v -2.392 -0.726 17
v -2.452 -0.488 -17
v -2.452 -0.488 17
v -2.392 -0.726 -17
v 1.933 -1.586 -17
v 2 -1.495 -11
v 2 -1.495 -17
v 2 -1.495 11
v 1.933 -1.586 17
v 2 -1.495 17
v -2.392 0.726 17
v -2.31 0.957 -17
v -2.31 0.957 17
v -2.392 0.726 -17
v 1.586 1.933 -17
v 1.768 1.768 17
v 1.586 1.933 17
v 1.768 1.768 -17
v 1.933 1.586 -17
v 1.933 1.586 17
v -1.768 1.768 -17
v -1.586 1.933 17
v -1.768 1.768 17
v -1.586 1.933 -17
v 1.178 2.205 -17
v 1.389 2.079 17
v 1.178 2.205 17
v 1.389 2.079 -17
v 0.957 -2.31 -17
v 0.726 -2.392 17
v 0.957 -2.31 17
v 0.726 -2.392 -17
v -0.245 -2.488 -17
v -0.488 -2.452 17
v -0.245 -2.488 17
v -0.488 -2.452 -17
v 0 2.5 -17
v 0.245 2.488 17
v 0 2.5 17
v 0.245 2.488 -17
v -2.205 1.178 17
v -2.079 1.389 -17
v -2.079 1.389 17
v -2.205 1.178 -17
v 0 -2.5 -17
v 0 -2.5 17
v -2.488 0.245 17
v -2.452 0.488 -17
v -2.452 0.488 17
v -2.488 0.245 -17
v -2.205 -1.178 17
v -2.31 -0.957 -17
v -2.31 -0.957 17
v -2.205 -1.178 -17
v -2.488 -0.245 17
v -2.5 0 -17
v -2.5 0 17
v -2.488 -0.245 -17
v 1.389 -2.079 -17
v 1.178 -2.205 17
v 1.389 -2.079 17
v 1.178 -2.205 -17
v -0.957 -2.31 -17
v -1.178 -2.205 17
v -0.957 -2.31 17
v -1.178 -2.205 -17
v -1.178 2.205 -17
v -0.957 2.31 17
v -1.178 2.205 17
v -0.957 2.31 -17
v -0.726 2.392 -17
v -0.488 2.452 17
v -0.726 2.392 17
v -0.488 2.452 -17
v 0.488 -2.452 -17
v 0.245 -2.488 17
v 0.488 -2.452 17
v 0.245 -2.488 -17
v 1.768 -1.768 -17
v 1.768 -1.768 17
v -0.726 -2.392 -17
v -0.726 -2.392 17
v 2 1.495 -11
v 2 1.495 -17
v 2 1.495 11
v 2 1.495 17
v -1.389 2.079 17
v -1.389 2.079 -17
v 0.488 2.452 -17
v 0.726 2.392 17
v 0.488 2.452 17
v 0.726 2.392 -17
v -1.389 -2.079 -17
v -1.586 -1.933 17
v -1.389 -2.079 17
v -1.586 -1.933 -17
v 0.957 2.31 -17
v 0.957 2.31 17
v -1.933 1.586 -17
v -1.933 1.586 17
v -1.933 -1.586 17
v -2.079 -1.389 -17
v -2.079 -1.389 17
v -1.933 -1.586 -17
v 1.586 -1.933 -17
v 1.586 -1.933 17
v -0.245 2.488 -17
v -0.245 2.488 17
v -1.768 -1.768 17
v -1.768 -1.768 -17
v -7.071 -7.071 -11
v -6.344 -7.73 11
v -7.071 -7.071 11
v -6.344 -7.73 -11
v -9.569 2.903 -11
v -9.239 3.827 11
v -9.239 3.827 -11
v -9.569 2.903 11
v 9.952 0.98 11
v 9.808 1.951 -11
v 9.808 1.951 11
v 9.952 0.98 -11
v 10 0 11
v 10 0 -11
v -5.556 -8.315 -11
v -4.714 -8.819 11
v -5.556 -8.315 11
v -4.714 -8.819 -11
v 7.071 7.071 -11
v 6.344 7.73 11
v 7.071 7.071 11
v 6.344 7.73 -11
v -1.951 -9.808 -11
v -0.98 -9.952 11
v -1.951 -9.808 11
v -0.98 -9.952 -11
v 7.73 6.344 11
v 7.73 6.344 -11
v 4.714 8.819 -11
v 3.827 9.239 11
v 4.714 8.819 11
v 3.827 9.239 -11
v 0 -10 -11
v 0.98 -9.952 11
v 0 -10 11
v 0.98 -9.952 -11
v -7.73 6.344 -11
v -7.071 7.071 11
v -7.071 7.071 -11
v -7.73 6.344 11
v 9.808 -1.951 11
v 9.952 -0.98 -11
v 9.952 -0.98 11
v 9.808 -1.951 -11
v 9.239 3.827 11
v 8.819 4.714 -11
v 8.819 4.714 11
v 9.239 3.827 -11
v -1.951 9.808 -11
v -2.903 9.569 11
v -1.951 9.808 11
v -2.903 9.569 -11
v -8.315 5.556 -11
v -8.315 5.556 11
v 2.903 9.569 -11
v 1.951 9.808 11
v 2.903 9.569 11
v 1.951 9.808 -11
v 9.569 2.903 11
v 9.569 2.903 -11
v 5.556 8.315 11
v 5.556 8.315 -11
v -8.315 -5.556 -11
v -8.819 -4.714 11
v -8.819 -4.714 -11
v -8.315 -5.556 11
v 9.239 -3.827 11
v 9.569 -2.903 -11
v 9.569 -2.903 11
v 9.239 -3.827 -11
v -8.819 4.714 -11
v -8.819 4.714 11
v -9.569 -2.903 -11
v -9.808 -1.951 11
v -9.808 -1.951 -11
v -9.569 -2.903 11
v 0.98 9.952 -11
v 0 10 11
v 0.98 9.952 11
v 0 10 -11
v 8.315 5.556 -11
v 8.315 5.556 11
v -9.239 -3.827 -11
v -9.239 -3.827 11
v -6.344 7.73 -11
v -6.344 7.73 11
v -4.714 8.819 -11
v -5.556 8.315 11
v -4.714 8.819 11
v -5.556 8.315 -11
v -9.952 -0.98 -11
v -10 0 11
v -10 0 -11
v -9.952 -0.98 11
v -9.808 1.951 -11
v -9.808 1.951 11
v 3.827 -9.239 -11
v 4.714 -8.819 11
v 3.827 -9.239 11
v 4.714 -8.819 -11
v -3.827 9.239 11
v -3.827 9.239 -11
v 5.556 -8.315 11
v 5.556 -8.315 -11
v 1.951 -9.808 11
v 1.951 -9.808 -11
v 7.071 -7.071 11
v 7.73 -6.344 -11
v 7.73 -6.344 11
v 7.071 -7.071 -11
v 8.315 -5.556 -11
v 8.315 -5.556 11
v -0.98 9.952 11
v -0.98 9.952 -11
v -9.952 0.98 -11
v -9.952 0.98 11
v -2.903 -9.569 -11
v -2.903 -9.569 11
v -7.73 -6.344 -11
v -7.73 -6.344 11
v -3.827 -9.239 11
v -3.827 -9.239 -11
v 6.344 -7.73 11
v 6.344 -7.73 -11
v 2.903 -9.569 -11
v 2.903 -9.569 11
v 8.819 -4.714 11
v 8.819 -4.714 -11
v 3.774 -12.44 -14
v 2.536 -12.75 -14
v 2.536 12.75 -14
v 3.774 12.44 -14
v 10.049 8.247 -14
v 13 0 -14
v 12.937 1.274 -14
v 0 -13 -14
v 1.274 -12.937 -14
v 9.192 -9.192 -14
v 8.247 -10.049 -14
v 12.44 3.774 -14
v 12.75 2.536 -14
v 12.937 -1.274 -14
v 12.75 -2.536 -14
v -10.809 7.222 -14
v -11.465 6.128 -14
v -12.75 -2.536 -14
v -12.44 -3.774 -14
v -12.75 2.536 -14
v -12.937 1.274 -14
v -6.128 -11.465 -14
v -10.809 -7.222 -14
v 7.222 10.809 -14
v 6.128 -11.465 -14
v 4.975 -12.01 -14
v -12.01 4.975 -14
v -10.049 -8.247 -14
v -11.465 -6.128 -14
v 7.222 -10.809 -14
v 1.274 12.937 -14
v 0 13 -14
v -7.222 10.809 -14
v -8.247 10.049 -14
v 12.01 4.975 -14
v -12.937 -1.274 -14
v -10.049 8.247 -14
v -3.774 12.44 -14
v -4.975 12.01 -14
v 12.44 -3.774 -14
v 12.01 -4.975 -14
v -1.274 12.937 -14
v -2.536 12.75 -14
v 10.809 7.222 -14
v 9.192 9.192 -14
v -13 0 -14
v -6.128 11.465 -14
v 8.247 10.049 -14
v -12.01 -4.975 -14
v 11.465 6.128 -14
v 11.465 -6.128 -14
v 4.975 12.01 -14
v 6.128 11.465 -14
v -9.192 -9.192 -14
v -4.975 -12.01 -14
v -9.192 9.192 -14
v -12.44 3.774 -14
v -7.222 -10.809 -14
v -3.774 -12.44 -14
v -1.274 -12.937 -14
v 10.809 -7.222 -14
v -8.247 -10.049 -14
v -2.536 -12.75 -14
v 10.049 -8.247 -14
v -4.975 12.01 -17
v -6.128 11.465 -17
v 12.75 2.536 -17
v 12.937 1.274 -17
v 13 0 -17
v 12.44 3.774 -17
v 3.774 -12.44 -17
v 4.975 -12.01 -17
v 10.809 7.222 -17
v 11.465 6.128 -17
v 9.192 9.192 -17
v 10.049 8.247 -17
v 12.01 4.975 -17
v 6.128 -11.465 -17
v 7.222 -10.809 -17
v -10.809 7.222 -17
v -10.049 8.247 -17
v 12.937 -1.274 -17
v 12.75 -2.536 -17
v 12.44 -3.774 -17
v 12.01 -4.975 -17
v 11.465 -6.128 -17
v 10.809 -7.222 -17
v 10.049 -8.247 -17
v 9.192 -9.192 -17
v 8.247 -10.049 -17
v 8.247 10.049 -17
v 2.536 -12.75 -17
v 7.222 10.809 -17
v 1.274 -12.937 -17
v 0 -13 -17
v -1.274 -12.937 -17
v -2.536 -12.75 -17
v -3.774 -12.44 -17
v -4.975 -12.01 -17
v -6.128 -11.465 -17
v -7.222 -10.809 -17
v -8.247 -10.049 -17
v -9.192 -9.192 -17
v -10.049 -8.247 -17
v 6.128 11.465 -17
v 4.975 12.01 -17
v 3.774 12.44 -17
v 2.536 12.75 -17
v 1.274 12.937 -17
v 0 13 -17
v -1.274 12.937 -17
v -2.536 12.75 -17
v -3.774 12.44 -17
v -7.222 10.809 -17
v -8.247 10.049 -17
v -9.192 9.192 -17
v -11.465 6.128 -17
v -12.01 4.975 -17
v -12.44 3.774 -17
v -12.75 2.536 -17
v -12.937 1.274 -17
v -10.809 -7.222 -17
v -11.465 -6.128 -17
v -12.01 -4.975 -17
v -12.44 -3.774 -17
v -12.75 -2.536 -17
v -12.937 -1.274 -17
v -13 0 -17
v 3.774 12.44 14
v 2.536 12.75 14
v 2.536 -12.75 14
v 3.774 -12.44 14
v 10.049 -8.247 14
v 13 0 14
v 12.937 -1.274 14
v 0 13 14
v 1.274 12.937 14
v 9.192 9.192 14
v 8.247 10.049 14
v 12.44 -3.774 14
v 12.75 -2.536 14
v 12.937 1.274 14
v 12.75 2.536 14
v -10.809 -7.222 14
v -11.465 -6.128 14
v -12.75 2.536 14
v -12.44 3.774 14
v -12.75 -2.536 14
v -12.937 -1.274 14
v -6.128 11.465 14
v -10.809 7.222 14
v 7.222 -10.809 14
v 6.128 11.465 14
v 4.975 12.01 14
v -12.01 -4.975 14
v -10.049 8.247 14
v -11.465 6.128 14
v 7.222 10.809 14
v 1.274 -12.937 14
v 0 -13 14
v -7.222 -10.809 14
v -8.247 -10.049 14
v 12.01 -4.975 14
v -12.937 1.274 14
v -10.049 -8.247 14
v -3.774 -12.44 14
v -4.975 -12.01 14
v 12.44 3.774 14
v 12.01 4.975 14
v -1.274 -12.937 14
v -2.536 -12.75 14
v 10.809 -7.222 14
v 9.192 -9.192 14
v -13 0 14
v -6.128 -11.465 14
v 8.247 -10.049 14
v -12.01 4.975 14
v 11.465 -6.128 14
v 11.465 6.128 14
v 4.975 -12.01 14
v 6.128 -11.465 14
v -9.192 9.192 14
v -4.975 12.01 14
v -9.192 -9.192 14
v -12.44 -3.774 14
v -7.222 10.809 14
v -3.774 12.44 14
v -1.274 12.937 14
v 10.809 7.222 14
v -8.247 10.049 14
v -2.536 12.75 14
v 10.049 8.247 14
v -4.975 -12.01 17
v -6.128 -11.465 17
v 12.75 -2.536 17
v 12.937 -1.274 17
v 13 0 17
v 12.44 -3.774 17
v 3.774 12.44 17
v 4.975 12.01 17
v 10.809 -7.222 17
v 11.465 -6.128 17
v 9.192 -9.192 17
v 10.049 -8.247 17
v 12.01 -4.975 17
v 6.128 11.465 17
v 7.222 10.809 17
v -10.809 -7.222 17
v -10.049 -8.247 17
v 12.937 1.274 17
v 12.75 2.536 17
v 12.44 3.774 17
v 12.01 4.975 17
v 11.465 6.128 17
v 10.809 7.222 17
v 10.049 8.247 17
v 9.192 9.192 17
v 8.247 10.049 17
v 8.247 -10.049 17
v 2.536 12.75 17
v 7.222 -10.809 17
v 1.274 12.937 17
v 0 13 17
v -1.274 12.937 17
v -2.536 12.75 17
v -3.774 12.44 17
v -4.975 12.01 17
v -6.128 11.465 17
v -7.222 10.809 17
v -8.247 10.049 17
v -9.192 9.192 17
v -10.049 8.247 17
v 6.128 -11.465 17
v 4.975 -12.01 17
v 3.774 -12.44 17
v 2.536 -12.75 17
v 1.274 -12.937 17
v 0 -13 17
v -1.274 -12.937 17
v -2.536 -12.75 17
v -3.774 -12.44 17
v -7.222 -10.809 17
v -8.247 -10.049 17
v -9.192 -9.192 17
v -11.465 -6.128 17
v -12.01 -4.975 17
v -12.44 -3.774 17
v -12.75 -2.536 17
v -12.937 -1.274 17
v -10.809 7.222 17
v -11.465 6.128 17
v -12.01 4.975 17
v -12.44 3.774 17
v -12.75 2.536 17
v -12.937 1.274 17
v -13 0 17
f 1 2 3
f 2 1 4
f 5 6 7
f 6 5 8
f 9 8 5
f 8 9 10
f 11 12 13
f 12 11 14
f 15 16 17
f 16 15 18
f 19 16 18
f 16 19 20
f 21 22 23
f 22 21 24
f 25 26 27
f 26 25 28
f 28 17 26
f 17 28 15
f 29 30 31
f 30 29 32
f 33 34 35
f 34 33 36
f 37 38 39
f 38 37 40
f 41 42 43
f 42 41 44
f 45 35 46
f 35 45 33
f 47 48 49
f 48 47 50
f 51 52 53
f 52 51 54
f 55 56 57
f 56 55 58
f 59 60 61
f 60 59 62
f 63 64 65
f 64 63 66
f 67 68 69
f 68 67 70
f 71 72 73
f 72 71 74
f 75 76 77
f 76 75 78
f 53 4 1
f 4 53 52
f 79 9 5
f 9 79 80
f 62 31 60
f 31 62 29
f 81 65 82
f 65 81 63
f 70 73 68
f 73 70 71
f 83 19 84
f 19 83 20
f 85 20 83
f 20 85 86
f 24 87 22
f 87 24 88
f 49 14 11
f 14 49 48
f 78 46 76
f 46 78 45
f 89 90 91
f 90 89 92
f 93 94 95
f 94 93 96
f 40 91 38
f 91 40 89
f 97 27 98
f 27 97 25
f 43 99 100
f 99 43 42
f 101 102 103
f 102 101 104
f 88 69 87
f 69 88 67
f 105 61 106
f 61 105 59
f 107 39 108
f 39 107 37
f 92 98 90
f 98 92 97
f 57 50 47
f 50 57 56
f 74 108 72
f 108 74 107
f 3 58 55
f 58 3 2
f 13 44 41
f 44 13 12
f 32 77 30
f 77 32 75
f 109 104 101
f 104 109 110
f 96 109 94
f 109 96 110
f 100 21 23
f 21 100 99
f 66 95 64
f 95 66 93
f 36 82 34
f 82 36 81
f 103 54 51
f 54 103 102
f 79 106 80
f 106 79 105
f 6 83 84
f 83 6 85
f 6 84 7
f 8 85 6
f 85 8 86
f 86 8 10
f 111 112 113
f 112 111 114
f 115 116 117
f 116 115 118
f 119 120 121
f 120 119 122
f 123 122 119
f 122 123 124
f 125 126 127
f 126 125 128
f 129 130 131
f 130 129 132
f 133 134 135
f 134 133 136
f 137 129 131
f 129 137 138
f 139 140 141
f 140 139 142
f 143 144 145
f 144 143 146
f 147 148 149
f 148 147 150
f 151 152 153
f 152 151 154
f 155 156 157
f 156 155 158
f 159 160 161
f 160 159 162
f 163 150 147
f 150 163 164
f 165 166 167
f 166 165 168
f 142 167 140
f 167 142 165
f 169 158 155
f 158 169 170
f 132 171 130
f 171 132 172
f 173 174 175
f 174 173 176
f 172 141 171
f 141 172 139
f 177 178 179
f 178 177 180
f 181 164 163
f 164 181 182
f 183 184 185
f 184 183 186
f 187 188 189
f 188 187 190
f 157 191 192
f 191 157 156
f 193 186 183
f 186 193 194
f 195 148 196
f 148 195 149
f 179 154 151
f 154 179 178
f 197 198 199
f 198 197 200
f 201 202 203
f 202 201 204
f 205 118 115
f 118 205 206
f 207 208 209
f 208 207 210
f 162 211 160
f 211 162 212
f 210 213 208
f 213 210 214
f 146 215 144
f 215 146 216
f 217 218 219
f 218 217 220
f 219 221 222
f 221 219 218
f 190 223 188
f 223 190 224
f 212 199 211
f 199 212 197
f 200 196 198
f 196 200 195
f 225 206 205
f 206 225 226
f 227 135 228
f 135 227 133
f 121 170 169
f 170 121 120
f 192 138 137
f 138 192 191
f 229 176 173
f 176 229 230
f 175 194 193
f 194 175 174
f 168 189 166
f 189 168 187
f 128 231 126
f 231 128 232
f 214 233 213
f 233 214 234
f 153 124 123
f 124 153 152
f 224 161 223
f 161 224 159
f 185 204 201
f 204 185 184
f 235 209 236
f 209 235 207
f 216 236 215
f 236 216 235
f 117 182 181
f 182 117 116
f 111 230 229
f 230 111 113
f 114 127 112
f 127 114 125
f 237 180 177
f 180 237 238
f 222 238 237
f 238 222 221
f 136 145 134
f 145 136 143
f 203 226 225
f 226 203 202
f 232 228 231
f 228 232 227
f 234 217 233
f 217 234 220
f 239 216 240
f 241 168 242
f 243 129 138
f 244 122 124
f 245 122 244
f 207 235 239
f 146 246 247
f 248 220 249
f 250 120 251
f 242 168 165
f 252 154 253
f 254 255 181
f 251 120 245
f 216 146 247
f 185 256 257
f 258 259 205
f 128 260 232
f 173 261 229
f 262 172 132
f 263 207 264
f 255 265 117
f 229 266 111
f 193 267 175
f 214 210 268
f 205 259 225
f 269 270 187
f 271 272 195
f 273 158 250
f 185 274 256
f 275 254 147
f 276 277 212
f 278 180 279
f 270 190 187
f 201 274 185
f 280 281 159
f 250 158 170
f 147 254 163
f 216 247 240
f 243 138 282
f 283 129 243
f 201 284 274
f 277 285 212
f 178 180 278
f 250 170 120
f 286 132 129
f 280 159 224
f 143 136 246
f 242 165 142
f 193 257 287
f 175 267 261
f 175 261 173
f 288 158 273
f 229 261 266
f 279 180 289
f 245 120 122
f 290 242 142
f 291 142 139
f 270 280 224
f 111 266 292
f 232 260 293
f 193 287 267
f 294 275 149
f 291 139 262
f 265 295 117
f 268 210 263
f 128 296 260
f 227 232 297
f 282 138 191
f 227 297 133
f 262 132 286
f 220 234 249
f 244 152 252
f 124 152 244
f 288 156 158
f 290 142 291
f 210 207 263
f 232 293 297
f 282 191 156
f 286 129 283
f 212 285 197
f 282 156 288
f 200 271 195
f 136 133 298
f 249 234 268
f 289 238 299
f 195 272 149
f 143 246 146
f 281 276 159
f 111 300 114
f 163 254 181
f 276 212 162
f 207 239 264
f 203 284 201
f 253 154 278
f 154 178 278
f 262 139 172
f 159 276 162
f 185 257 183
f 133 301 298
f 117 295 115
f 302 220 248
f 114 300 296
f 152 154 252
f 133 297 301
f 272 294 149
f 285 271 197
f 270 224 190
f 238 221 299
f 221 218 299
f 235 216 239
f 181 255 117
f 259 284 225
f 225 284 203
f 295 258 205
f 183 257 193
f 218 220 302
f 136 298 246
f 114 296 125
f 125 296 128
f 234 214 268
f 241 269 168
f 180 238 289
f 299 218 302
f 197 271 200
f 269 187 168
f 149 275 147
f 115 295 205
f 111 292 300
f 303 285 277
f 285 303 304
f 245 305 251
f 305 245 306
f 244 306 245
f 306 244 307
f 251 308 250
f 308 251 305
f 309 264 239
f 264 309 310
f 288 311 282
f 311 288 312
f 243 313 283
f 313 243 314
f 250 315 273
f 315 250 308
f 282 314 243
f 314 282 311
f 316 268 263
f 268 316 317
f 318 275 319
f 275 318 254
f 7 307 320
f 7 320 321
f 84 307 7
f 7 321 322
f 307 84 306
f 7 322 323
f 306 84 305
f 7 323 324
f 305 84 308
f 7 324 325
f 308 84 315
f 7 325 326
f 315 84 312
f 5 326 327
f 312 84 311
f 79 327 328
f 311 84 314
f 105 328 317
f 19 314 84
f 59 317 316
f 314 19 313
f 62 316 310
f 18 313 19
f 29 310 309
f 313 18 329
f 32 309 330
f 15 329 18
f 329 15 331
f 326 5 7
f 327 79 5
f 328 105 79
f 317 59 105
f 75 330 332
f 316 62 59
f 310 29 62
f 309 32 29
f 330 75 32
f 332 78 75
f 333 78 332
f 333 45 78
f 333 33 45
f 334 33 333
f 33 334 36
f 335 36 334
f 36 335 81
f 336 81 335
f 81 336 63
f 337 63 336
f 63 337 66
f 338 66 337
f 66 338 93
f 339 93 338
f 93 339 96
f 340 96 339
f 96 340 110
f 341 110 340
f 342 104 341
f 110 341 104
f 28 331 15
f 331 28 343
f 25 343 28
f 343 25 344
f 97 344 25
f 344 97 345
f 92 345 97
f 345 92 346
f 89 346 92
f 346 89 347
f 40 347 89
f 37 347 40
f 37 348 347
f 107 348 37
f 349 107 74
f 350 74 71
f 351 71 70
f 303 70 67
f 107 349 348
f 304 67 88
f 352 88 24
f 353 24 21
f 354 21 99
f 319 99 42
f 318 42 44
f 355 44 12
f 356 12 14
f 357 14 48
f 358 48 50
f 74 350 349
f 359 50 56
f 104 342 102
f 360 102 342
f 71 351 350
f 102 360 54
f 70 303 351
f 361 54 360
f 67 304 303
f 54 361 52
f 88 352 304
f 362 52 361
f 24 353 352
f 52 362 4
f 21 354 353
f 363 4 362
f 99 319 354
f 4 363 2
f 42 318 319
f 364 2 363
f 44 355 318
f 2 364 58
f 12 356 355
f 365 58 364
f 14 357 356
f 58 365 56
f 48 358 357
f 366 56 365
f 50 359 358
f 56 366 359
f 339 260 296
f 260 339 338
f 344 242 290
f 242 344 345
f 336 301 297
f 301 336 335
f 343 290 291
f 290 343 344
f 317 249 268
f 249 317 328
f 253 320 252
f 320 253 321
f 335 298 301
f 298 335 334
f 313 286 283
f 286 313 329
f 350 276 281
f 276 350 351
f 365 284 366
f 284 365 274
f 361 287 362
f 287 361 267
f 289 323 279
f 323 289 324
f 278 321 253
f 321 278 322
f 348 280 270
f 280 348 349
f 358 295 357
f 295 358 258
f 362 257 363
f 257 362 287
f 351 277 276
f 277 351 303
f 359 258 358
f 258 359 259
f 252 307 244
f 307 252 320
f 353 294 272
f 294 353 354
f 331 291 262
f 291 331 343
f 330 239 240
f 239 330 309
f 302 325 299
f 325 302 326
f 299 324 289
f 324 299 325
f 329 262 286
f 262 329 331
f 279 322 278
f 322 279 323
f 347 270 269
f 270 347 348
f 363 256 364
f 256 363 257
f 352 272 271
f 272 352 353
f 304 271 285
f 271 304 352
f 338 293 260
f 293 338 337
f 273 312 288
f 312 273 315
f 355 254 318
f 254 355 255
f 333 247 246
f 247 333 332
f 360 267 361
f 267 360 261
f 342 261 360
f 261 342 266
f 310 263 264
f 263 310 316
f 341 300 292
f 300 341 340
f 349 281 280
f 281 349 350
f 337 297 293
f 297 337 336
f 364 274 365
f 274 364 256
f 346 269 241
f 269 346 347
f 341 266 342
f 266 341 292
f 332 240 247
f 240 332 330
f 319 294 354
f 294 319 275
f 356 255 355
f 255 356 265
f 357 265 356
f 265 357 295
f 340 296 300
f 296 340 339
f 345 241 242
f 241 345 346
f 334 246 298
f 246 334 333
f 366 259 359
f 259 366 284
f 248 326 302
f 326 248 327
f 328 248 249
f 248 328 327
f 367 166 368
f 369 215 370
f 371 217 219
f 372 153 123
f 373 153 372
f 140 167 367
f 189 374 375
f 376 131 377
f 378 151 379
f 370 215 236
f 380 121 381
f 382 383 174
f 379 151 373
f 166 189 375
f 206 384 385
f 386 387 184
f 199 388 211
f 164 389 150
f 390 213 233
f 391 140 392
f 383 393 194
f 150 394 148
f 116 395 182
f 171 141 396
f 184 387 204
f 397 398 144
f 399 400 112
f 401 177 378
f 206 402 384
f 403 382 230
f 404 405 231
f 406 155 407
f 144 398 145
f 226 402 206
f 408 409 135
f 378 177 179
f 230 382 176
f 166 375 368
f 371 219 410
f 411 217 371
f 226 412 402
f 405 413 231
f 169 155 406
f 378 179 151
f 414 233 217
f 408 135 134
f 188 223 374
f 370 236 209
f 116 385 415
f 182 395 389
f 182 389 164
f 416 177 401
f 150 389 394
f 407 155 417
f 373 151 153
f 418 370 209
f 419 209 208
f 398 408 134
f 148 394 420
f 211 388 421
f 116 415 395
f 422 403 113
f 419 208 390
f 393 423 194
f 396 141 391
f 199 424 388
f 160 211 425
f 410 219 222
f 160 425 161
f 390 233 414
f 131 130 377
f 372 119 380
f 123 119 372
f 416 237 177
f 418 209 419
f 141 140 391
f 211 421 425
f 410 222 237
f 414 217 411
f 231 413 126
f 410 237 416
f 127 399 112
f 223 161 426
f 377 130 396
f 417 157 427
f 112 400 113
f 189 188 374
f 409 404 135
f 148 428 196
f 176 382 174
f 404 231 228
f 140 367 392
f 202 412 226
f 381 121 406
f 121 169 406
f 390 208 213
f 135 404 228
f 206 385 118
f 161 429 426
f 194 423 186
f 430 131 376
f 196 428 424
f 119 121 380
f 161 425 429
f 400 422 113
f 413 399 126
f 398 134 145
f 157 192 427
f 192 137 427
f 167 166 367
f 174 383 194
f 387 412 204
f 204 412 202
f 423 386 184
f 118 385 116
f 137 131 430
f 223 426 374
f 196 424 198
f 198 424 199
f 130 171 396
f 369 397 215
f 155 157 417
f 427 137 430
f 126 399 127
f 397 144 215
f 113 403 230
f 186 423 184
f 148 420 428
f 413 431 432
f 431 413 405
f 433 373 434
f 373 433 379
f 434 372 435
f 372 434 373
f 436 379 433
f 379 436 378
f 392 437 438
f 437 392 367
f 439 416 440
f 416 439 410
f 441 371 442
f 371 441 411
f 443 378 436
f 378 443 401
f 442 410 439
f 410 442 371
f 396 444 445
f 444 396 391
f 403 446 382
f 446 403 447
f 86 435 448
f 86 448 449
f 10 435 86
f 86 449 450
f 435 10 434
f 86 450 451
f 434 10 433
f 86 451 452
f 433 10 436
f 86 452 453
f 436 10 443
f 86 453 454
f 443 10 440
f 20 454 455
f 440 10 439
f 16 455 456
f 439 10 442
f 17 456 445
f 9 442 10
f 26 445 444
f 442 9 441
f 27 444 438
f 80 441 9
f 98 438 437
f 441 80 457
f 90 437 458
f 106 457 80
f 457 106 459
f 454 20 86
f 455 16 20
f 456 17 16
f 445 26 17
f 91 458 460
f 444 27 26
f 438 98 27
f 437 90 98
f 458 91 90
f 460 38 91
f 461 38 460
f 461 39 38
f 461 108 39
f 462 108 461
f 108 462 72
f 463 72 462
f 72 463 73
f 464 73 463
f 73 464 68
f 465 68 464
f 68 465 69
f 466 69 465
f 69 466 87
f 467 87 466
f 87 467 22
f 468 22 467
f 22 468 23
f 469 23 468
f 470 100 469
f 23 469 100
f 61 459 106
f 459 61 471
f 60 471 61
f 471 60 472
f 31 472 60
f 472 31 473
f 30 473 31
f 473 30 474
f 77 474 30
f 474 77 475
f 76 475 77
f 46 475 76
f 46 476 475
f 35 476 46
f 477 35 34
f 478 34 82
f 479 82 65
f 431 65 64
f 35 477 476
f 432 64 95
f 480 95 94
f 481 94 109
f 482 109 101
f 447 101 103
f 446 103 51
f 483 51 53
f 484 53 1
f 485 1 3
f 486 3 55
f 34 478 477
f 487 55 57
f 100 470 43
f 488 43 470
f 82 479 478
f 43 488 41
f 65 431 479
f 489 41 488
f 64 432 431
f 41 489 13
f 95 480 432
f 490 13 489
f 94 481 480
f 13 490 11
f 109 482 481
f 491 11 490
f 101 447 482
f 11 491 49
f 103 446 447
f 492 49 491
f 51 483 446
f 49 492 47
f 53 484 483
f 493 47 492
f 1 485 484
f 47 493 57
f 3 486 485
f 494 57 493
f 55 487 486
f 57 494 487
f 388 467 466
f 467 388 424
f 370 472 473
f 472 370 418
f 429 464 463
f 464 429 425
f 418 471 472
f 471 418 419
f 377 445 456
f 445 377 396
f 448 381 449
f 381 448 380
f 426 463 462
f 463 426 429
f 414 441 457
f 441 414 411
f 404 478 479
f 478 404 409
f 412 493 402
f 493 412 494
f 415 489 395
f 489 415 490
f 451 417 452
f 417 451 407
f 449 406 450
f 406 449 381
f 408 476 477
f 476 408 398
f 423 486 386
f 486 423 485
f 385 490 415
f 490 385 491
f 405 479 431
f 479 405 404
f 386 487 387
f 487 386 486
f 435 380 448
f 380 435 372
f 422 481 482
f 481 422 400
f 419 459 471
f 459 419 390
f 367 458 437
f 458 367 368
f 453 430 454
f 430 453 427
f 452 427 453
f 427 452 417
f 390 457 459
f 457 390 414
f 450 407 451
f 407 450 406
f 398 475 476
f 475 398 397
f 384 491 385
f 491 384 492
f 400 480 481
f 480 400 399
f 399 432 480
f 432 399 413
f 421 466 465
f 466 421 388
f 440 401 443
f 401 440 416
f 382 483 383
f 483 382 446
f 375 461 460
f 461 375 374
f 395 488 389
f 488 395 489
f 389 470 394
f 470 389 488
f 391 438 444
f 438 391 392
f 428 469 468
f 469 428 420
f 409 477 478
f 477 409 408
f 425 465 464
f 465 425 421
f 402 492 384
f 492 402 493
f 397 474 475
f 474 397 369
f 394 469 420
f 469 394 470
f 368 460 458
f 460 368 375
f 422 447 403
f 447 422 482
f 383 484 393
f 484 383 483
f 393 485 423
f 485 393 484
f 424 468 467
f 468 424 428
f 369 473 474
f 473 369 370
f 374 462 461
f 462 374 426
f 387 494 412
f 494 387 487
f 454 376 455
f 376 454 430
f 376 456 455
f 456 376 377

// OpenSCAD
$fn= $preview ? 32 : 64;

total_height = 34;

base_height = 6;

center_height = total_height - base_height*2;
center_radius = 10;

base_radius = center_radius + 3;

base_shift = center_height / 2 + base_height/4;

module hole() {
    difference() {
        cylinder(total_height, 2.5, 2.5, center=true);
        translate([4, 0, 0]) {
            cube([4, 4, total_height], center=true);
        }   
    }
}

module center() {
    difference() {
        cylinder(center_height, center_radius, center_radius, center = true);
        hole();
    }
}

module base() {
    difference(){
        union() {        
            cylinder(base_height/2, base_radius, center_radius, center = true);
            translate([0, 0, -base_height/2]) {
                cylinder(base_height/2, base_radius, base_radius, center = true);
            }
        }
        hole();
    }
}

center();

translate([0, 0, -base_shift]) {
   base();
}

translate([0, 0, base_shift]) {
    rotate([180,0,0]) { 
        base();
    }
}
